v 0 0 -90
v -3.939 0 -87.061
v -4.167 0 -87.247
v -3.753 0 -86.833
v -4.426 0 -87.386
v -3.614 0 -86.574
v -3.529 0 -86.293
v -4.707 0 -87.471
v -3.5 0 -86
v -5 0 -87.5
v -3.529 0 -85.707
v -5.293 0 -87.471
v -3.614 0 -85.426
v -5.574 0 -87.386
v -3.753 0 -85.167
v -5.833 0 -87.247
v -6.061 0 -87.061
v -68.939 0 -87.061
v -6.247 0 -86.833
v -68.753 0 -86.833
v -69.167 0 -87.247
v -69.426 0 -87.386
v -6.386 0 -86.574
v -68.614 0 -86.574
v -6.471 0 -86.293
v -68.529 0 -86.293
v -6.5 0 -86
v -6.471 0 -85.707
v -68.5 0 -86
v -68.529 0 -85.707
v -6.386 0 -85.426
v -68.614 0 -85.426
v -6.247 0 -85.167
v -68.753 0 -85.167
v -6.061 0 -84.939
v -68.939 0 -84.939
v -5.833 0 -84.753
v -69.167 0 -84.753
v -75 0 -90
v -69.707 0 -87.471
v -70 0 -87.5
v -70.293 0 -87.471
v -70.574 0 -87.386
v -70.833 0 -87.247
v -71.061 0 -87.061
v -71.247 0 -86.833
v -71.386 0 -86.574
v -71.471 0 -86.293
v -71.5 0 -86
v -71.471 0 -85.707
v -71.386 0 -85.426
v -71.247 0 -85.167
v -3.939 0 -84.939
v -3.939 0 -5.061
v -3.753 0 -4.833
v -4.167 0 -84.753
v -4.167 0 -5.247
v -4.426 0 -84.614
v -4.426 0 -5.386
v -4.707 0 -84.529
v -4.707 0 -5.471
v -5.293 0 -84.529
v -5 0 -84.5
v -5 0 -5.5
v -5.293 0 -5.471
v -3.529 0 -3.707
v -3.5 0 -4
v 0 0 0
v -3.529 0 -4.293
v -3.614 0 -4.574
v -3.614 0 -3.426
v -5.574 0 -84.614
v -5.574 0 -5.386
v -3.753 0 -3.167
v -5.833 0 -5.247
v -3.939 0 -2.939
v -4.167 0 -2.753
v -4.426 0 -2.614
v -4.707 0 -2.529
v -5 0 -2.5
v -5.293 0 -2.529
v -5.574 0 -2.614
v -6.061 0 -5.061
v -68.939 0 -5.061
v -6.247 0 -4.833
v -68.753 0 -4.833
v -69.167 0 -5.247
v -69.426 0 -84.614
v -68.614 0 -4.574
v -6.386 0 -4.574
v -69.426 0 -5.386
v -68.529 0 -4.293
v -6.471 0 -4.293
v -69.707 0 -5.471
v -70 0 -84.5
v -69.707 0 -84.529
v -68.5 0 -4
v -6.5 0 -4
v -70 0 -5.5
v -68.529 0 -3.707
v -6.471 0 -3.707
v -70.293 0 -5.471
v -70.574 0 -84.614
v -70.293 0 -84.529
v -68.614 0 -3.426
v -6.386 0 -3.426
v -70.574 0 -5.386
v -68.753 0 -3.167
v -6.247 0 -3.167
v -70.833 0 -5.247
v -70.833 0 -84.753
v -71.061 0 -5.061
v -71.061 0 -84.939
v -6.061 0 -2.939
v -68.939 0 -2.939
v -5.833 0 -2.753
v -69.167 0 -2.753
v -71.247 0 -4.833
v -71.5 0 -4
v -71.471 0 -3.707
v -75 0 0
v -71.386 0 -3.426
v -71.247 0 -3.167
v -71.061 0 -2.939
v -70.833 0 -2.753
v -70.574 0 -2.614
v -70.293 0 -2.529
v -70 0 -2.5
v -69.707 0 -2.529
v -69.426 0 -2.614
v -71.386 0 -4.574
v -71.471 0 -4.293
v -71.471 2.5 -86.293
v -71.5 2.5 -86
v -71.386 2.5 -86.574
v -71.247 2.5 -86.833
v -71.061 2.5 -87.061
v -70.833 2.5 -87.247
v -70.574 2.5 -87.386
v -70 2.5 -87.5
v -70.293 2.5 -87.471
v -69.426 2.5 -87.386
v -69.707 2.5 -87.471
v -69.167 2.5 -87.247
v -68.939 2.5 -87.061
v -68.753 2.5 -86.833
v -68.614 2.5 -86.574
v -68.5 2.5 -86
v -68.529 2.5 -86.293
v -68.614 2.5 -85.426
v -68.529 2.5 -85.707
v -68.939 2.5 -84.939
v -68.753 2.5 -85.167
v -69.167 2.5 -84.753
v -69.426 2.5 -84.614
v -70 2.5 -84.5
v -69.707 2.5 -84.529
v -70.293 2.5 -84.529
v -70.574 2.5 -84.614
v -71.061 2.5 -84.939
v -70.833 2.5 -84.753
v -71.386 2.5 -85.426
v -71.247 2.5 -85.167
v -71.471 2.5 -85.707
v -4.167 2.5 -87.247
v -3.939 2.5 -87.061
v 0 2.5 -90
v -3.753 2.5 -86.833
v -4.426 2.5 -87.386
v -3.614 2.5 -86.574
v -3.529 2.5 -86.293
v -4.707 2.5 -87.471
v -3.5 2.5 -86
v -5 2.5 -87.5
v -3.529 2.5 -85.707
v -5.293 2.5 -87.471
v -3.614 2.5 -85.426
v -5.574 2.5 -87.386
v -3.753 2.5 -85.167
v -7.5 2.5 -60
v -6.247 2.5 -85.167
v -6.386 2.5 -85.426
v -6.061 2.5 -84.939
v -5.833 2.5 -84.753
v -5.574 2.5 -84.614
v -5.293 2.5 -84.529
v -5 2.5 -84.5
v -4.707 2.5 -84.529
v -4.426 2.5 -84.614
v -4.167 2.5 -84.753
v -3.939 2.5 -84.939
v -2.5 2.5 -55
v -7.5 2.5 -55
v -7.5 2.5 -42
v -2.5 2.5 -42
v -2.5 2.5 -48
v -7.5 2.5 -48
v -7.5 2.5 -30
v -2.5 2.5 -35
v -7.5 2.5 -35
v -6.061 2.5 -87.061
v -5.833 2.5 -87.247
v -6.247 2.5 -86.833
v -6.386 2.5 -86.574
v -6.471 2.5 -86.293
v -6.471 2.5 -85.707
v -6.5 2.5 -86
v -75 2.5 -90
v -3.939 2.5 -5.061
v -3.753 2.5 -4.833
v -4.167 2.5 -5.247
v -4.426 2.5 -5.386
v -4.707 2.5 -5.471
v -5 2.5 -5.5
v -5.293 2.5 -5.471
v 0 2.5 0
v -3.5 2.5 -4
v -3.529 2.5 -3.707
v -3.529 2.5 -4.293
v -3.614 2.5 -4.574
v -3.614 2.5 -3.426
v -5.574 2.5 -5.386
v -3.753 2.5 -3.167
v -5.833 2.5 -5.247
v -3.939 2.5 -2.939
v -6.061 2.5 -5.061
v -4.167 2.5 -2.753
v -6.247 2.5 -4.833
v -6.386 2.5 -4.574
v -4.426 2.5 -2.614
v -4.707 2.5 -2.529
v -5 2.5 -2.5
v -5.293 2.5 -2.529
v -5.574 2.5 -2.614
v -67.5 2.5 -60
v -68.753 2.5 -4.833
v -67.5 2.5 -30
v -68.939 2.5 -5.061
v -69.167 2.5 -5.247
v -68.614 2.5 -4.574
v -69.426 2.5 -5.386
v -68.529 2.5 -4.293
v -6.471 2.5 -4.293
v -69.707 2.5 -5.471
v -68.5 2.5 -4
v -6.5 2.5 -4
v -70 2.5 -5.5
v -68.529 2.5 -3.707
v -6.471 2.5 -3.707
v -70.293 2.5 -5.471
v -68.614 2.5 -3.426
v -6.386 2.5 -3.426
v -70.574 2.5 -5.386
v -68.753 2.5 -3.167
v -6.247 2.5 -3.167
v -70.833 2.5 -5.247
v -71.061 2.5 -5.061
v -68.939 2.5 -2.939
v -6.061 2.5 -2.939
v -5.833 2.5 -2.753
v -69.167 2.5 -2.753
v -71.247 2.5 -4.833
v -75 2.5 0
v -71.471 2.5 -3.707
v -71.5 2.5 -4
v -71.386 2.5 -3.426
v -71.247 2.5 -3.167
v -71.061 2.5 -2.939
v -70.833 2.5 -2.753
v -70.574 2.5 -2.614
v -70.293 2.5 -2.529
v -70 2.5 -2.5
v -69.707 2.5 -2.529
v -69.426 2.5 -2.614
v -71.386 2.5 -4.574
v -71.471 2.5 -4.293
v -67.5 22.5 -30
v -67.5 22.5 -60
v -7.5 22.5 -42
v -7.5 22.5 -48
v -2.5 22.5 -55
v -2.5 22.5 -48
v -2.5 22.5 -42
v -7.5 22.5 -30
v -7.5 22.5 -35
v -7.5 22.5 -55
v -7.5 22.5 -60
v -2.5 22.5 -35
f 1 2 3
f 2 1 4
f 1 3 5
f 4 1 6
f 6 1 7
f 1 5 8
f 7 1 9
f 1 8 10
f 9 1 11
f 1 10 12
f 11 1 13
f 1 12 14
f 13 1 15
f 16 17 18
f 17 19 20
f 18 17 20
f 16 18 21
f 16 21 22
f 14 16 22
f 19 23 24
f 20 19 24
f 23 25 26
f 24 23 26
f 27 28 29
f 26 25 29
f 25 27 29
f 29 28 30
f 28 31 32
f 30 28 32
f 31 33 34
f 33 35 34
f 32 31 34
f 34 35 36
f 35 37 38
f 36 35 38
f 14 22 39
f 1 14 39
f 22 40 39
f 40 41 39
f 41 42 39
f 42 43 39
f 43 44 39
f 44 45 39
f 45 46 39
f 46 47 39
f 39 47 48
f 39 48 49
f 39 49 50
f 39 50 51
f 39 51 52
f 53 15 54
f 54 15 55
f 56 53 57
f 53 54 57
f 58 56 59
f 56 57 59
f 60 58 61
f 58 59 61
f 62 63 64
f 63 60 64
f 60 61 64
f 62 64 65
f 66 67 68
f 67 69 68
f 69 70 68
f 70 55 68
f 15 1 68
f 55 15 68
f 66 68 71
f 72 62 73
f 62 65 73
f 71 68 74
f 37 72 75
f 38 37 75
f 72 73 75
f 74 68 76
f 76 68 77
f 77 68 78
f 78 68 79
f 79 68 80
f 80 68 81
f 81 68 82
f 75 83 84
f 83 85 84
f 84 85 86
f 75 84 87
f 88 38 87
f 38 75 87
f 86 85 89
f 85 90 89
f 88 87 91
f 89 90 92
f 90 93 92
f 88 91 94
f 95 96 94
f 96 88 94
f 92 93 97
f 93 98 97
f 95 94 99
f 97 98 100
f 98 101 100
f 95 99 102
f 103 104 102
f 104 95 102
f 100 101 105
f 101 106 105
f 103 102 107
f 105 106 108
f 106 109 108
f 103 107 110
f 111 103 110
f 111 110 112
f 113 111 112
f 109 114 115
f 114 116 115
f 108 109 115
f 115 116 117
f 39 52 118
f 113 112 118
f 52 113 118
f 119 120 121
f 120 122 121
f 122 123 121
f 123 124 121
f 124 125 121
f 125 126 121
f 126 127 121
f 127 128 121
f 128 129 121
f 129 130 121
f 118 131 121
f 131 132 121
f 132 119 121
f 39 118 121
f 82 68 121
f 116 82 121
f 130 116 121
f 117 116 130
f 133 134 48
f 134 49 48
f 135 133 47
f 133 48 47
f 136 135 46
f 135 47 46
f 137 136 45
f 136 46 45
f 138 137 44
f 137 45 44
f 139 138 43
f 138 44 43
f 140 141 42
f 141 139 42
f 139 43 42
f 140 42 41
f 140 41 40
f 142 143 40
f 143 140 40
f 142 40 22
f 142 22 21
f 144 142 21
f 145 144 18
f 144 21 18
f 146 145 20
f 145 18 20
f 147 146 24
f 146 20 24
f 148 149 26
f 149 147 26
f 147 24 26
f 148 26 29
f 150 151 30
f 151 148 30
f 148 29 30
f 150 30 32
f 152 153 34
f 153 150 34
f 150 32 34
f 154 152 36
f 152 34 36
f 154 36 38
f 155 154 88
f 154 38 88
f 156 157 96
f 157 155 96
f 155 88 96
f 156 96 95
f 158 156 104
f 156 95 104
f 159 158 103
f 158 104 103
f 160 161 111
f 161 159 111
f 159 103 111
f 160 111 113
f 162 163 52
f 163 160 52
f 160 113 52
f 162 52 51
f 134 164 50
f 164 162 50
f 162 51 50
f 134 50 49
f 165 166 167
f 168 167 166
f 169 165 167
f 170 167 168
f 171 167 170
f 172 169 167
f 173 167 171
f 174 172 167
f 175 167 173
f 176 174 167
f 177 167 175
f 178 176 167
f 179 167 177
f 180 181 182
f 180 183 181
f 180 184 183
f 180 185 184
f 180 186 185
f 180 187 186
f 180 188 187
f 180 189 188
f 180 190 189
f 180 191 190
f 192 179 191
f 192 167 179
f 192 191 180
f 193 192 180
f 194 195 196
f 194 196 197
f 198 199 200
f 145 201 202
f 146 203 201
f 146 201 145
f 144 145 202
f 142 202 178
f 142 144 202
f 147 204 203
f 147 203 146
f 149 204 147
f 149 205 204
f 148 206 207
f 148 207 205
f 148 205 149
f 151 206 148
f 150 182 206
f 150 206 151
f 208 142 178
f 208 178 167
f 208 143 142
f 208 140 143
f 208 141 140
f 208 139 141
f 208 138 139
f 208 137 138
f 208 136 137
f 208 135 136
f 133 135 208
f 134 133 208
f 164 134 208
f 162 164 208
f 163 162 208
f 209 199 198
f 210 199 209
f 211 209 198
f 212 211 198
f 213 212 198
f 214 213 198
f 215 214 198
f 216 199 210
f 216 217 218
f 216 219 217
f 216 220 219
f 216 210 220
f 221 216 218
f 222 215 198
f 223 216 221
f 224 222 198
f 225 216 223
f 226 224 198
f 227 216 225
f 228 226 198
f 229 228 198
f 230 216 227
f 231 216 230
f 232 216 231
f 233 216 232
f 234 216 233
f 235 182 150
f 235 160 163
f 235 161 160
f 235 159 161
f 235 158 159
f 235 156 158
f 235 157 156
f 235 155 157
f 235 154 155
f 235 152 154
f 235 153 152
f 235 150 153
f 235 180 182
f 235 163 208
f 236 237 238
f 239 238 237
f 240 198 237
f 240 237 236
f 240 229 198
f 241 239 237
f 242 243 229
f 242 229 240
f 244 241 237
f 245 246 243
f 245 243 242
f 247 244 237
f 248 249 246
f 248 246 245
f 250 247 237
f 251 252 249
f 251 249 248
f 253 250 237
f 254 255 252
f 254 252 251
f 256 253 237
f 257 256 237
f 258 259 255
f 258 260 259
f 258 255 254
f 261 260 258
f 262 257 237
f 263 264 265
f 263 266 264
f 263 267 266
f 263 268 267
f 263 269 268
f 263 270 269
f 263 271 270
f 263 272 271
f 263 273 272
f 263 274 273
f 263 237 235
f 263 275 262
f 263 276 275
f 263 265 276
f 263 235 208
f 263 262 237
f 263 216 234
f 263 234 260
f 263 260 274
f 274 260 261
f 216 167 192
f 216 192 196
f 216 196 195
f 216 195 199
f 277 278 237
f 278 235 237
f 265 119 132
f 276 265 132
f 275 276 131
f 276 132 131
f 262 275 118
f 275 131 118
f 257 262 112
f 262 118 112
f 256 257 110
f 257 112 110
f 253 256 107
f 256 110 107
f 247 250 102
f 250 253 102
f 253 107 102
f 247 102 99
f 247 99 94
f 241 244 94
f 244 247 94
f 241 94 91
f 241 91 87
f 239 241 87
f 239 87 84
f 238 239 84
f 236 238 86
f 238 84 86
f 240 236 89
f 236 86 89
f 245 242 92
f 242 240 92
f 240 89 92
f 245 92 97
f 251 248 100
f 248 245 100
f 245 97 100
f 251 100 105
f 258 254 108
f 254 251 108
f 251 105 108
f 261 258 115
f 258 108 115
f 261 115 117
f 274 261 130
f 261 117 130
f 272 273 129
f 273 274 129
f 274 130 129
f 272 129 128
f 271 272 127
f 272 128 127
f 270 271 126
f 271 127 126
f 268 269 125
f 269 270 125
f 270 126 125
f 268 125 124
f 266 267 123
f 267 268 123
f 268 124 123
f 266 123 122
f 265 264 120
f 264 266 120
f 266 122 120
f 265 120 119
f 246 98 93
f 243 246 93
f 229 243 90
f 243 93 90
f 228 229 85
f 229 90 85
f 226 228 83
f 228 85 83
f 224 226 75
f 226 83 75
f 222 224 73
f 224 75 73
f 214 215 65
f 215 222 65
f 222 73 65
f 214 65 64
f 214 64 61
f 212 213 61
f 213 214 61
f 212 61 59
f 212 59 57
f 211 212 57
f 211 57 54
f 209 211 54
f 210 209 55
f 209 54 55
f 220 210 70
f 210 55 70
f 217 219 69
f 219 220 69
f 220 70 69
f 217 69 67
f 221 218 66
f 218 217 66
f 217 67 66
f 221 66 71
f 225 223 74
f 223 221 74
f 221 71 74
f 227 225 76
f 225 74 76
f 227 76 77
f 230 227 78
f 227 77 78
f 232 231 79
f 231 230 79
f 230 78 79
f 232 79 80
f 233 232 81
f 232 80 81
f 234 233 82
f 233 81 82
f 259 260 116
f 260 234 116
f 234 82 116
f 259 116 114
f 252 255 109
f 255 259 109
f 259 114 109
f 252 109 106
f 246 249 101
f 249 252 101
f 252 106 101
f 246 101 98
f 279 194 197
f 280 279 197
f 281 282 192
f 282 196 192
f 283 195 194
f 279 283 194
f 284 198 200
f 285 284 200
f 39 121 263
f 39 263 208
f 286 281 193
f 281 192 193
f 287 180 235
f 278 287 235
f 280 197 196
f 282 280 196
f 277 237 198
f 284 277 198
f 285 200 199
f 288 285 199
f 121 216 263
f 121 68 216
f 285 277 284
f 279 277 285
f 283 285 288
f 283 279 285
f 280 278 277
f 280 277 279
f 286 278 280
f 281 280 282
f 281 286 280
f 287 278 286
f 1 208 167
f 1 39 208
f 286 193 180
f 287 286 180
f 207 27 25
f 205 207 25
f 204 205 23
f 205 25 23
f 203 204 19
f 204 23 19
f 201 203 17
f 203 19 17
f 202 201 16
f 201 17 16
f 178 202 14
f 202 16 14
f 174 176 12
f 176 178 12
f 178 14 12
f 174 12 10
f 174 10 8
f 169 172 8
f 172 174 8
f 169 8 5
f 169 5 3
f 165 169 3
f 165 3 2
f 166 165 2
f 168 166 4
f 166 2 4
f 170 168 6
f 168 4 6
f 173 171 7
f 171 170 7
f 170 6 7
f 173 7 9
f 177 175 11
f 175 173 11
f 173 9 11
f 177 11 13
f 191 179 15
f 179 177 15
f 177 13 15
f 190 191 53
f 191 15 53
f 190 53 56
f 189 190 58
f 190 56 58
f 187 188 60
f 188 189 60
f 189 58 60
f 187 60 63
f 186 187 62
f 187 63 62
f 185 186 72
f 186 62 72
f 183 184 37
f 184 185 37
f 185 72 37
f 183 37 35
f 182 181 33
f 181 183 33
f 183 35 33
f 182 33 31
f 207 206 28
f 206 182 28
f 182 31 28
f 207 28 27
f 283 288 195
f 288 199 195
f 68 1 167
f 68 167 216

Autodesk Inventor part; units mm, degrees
ref_plane "YZ Plane" through (0, 0, 0) normal (1, 0, 0) x (0, 1, 0)
ref_plane "XZ Plane" through (0, 0, 0) normal (0, 1, 0) x (-1, 0, 0)
ref_plane "XY Plane" through (0, 0, 0) normal (0, 0, 1) x (1, 0, 0)
sketch "スケッチ1" plane through (0, 0, 0) normal (0, 1, 0) x (-1, 0, 0)
  line L0 (0, 0) -> (75, 0)
  line L1 (75, 0) -> (75, -90)
  line L2 (75, -90) -> (0, -90)
  line L3 (0, -90) -> (0, 0)
  circle A0 centre (70, -4) radius 1.5
  circle A1 centre (70, -86) radius 1.5
  circle A2 centre (5, -4) radius 1.5
  circle A3 centre (5, -86) radius 1.5
  dimension "d0" = 75
  dimension "d1" = 90
  dimension "d4" = 3
  dimension "d5" = 5
  dimension "d6" = 4
  dimension "d7" = 4
  dimension "d8" = 5
  dimension "d9" = 5
  dimension "d10" = 4
  dimension "d11" = 4
extrude "押し出し1" add sketch "スケッチ1" along normal blind 2.5
sketch "スケッチ2" plane through (0, 2.5, 0) normal (0, 1, 0) x (1, 0, 0)
  line L0 (-67.5, 30) -> (-7.5, 30)
  line L1 (-7.5, 30) -> (-7.5, 60)
  line L2 (-7.5, 60) -> (-67.5, 60)
  line L3 (-67.5, 60) -> (-67.5, 30)
  line L4 (-75, 90) -> (-75, 0) projected
  line L5 (0, 90) -> (-75, 90) projected
  line L6 (-7.5, 35) -> (-2.5, 35)
  line L7 (-2.5, 35) -> (-2.5, 42)
  line L8 (-2.5, 42) -> (-7.5, 42)
  line L9 (-7.5, 42) -> (-7.5, 35)
  line L10 (-7.5, 48) -> (-2.5, 48)
  line L11 (-2.5, 48) -> (-2.5, 55)
  line L12 (-2.5, 55) -> (-7.5, 55)
  line L13 (-7.5, 55) -> (-7.5, 48)
  point P0 (0, 0)
  point P1 (-67.5, 45)
  point P2 (-75, 45)
  point P3 (-37.5, 60)
  point P4 (-37.5, 90)
  dimension "d13" = 30
  dimension "d14" = 60
  dimension "d15" = 5
  dimension "d16" = 5
  dimension "d17" = 7
  dimension "d18" = 5
extrude "押し出し2" add sketch "スケッチ2" along normal blind 20
equation "\"d7\" = d6"
equation "\"d9\" = d5"
equation "\"d10\" = d6"
equation "\"d11\" = d6"
equation "\"d16\" = d15"
properties part number "control_board"
